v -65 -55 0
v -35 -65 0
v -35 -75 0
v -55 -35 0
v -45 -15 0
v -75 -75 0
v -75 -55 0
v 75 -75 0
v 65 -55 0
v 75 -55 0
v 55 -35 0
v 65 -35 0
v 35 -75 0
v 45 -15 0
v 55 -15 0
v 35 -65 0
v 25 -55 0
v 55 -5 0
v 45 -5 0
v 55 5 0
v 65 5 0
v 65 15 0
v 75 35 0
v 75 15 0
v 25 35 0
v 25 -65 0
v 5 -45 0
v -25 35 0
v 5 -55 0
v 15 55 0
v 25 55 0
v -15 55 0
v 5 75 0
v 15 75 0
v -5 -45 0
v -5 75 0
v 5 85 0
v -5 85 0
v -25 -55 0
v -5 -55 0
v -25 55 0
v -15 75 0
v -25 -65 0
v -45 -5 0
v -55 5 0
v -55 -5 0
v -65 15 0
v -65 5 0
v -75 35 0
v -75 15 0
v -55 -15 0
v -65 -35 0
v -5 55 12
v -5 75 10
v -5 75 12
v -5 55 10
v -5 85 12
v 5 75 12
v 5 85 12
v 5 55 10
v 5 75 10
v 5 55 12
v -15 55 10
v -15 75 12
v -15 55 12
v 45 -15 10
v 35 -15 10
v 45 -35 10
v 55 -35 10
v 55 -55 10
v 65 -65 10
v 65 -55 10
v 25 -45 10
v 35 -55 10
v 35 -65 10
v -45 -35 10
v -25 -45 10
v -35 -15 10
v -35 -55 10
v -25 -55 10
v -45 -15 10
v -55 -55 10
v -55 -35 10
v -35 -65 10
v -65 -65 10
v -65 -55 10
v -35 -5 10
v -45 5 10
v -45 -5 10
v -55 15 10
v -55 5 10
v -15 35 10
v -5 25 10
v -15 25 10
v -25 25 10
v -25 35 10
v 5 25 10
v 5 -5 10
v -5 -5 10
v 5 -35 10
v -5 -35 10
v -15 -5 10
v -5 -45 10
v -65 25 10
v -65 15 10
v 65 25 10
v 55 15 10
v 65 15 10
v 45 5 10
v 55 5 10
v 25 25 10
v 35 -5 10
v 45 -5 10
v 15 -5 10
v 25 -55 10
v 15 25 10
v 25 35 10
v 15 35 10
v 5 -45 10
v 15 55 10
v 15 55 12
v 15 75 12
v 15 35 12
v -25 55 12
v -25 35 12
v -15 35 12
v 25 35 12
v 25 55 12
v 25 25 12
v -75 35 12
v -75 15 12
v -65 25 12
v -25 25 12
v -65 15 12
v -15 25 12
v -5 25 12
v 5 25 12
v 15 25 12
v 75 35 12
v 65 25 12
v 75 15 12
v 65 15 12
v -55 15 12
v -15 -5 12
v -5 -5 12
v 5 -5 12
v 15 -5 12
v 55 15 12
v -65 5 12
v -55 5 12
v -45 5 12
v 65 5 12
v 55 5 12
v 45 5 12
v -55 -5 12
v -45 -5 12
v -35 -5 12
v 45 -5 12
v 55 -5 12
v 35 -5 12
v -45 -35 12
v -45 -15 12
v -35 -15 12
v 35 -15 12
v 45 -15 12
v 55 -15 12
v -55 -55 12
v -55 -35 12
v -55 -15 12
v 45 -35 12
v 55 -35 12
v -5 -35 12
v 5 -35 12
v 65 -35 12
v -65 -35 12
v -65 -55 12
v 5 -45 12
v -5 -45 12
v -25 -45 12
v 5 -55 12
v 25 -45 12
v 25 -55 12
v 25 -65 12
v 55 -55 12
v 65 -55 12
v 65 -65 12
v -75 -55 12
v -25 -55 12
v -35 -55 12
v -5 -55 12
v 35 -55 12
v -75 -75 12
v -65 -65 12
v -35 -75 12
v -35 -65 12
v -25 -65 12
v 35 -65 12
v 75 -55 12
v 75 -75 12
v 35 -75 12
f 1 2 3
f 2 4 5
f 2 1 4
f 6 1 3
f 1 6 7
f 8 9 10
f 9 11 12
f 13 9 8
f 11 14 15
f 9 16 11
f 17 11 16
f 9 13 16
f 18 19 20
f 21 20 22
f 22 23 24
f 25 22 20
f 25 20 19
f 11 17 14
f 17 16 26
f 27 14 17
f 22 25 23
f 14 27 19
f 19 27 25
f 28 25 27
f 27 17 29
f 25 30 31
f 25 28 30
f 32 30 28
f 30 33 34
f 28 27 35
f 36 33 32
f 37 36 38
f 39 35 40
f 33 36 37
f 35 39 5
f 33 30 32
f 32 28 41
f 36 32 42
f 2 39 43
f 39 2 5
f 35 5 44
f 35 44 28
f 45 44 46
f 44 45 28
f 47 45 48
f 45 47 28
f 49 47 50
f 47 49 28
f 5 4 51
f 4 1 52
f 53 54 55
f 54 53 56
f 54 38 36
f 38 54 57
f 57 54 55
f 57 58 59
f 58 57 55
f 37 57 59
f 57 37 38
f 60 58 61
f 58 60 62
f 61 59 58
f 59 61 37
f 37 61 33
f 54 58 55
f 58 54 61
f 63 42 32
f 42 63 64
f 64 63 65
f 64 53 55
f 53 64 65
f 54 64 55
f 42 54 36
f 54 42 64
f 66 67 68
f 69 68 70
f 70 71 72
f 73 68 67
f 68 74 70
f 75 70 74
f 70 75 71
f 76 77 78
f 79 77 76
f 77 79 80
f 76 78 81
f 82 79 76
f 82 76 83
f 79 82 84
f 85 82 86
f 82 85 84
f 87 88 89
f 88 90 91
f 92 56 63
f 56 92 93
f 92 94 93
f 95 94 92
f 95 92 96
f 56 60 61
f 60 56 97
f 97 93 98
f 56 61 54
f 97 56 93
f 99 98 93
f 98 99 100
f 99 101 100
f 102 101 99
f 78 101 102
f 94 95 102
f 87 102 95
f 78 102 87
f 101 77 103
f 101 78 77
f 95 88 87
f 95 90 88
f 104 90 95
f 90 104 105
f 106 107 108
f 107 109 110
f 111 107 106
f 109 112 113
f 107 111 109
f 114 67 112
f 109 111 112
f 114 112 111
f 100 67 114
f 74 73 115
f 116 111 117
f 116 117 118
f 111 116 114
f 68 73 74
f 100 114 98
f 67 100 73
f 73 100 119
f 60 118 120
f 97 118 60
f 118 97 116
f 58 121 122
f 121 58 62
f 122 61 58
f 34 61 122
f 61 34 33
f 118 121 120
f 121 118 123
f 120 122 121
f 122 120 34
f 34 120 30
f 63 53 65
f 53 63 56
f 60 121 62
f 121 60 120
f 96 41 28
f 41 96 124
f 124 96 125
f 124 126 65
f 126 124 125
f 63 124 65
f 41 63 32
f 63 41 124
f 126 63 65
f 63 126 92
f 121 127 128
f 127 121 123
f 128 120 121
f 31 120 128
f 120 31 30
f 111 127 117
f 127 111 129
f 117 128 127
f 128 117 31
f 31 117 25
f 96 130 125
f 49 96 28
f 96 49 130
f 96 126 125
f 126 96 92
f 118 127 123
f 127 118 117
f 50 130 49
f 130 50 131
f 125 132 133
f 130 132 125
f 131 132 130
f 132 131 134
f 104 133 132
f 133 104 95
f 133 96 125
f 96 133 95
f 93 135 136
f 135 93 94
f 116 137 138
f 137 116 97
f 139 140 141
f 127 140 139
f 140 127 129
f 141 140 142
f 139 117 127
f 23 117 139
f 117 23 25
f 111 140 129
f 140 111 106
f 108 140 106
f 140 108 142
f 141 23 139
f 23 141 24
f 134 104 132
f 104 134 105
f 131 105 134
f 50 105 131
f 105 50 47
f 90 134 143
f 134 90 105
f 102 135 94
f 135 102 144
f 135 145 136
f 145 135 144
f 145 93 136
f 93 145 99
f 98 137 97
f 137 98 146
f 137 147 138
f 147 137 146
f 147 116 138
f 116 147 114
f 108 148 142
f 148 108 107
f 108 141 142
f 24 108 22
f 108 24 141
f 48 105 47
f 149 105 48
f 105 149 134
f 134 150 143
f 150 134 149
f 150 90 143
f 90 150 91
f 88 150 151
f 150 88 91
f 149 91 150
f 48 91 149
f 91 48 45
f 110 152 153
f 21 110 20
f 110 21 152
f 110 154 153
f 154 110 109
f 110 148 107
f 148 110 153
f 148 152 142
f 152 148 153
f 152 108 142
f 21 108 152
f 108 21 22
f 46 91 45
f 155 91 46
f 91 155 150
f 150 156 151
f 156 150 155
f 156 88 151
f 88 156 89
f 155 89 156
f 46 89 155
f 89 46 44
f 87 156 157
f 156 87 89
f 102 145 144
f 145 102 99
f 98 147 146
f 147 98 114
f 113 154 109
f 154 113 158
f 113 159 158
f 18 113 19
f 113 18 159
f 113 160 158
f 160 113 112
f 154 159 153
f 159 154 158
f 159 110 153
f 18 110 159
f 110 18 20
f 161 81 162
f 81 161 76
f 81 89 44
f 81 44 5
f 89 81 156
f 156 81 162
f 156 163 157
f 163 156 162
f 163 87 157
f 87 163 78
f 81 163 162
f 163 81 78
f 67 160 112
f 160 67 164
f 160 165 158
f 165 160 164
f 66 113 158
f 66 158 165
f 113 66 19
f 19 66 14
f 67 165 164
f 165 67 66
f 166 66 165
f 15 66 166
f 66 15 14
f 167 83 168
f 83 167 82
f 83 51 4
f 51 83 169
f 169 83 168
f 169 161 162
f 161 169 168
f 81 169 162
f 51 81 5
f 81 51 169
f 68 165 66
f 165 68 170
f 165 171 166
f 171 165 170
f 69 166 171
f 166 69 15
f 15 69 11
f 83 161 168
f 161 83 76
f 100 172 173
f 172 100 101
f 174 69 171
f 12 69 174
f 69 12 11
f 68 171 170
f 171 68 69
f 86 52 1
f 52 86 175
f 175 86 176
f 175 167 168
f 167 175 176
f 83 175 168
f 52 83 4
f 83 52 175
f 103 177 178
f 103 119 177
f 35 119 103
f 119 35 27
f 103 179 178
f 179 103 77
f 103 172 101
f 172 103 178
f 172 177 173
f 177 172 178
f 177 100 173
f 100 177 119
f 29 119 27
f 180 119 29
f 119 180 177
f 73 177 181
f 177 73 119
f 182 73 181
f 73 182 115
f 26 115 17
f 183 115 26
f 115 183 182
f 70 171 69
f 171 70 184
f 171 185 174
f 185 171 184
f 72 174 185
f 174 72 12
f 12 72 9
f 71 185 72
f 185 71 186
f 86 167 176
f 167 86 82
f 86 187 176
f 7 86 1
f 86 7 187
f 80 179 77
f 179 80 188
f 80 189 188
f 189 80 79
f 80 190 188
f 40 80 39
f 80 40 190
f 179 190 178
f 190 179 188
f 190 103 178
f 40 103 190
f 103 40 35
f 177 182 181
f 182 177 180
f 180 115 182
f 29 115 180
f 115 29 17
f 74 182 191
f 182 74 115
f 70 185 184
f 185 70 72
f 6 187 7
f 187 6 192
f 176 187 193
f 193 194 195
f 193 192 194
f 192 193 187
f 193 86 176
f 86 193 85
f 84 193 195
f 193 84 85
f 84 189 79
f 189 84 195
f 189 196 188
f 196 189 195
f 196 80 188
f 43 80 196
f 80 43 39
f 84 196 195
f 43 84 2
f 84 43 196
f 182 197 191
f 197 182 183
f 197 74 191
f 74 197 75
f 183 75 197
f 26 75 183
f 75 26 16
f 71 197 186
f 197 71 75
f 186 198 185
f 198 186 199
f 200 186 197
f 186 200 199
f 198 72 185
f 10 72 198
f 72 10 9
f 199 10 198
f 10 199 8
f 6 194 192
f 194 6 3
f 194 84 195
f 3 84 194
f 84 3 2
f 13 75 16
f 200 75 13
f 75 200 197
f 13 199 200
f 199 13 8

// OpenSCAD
star();

module star() {
    pixel_canvas(canvas_size=170, pixel_count=17, pixels=STAR_PIXELS, color_palette=STAR_COLOR_PALETTE, color_heights=STAR_COLOR_HEIGHTS);
}

module pixel(x, y, pixel_color, pixel_height = 1.0) {
    color(pixel_color) {
	linear_extrude(height = pixel_height) {
	    translate([x, y]) {
		square(size = 1, center=true);
	    }
	}
    }
}

STAR_COLOR_PALETTE = [
  "yellow",
  "black",
];

STAR_COLOR_HEIGHTS = [
  1.0,
  1.2,
];

STAR_PIXELS = [
  [0, 8, 1],
  [-1, 7, 1], [0, 7, 0], [1, 7, 1],
  [-1, 6, 1], [0, 6, 0], [1, 6, 1],
  [-2, 5, 1], [-1, 5, 0], [0, 5, 0], [1, 5, 0], [2, 5, 1],
  [-2, 4, 1], [-1, 4, 0], [0, 4, 0], [1, 4, 0], [2, 4, 1],
  [-7, 3, 1], [-6, 3, 1], [-5, 3, 1], [-4, 3, 1], [-3, 3, 1], [-2, 3, 0], [-1, 3, 0], [0, 3, 0], [ 1, 3, 0], [2, 3, 0], [3, 3, 1], [4, 3, 1], [5, 3, 1], [6, 3, 1], [7, 3, 1],
  [-7, 2, 1], [-6, 2, 0], [-5, 2, 0], [-4, 2, 0], [-3, 2, 0], [-2, 2, 0], [-1, 2, 1], [0, 2, 0], [ 1, 2, 1], [2, 2, 0], [3, 2, 0], [4, 2, 0], [5, 2, 0], [6, 2, 0], [7, 2, 1],
  [-6, 1, 1], [-5, 1, 0], [-4, 1, 0], [-3, 1, 0], [-2, 1, 0], [-1, 1, 1], [0, 1, 0], [ 1, 1, 1], [2, 1, 0], [3, 1, 0], [4, 1, 0], [5, 1, 0], [6, 1, 1],
  [-5, 0, 1], [-4, 0, 0], [-3, 0, 0], [-2, 0, 0], [-1, 0, 1], [0, 0, 0], [ 1, 0, 1], [2, 0, 0], [3, 0, 0], [4, 0, 0], [5, 0, 1],
  [-4, -1, 1], [-3, -1, 0], [-2, -1, 0], [-1, -1, 0], [0, -1, 0], [1, -1, 0], [2, -1, 0], [3, -1, 0], [4, -1, 1],
  [-5, -2, 1], [-4, -2, 0], [-3, -2, 0], [-2, -2, 0], [-1, -2, 0], [0, -2, 0], [ 1, -2, 0], [2, -2, 0], [3, -2, 0], [4, -2, 0], [5, -2, 1],
  [-5, -3, 1], [-4, -3, 0], [-3, -3, 0], [-2, -3, 0], [-1, -3, 0], [0, -3, 0], [ 1, -3, 0], [2, -3, 0], [3, -3, 0], [4, -3, 0], [5, -3, 1],
  [-6, -4, 1], [-5, -4, 0], [-4, -4, 0], [-3, -4, 0], [-2, -4, 0], [-1, -4, 0], [0, -4, 1], [ 1, -4, 0], [2, -4, 0], [3, -4, 0], [4, -4, 0], [5, -4, 0], [6, -4, 1],
  [-6, -5, 1], [-5, -5, 0], [-4, -5, 0], [-3, -5, 0], [-2, -5, 1], [-1, -5, 1], [ 1, -5, 1], [2, -5, 1], [3, -5, 0], [4, -5, 0], [5, -5, 0], [6, -5, 1],
  [-7, -6, 1], [-6, -6, 0], [-5, -6, 0], [-4, -6, 0], [-3, -6, 1], [3, -6, 1], [4, -6, 0], [5, -6, 0], [6, -6, 0], [7, -6, 1],
  [-7, -7, 1], [-6, -7, 1], [-5, -7, 1], [-4, -7, 1], [4, -7, 1], [5, -7, 1], [6, -7, 1], [7, -7, 1],
];

module pixel_canvas(canvas_size, pixel_count, pixels, color_palette, color_heights) {
    pixel_size = canvas_size / pixel_count;
    scale([pixel_size, pixel_size, 1.0]) {
	for (coord = pixels) {
	    pixel(x=coord[0], y=coord[1], pixel_color=color_palette[coord[2]], pixel_height=color_heights[coord[2]] * pixel_size);
	}
    }
}
